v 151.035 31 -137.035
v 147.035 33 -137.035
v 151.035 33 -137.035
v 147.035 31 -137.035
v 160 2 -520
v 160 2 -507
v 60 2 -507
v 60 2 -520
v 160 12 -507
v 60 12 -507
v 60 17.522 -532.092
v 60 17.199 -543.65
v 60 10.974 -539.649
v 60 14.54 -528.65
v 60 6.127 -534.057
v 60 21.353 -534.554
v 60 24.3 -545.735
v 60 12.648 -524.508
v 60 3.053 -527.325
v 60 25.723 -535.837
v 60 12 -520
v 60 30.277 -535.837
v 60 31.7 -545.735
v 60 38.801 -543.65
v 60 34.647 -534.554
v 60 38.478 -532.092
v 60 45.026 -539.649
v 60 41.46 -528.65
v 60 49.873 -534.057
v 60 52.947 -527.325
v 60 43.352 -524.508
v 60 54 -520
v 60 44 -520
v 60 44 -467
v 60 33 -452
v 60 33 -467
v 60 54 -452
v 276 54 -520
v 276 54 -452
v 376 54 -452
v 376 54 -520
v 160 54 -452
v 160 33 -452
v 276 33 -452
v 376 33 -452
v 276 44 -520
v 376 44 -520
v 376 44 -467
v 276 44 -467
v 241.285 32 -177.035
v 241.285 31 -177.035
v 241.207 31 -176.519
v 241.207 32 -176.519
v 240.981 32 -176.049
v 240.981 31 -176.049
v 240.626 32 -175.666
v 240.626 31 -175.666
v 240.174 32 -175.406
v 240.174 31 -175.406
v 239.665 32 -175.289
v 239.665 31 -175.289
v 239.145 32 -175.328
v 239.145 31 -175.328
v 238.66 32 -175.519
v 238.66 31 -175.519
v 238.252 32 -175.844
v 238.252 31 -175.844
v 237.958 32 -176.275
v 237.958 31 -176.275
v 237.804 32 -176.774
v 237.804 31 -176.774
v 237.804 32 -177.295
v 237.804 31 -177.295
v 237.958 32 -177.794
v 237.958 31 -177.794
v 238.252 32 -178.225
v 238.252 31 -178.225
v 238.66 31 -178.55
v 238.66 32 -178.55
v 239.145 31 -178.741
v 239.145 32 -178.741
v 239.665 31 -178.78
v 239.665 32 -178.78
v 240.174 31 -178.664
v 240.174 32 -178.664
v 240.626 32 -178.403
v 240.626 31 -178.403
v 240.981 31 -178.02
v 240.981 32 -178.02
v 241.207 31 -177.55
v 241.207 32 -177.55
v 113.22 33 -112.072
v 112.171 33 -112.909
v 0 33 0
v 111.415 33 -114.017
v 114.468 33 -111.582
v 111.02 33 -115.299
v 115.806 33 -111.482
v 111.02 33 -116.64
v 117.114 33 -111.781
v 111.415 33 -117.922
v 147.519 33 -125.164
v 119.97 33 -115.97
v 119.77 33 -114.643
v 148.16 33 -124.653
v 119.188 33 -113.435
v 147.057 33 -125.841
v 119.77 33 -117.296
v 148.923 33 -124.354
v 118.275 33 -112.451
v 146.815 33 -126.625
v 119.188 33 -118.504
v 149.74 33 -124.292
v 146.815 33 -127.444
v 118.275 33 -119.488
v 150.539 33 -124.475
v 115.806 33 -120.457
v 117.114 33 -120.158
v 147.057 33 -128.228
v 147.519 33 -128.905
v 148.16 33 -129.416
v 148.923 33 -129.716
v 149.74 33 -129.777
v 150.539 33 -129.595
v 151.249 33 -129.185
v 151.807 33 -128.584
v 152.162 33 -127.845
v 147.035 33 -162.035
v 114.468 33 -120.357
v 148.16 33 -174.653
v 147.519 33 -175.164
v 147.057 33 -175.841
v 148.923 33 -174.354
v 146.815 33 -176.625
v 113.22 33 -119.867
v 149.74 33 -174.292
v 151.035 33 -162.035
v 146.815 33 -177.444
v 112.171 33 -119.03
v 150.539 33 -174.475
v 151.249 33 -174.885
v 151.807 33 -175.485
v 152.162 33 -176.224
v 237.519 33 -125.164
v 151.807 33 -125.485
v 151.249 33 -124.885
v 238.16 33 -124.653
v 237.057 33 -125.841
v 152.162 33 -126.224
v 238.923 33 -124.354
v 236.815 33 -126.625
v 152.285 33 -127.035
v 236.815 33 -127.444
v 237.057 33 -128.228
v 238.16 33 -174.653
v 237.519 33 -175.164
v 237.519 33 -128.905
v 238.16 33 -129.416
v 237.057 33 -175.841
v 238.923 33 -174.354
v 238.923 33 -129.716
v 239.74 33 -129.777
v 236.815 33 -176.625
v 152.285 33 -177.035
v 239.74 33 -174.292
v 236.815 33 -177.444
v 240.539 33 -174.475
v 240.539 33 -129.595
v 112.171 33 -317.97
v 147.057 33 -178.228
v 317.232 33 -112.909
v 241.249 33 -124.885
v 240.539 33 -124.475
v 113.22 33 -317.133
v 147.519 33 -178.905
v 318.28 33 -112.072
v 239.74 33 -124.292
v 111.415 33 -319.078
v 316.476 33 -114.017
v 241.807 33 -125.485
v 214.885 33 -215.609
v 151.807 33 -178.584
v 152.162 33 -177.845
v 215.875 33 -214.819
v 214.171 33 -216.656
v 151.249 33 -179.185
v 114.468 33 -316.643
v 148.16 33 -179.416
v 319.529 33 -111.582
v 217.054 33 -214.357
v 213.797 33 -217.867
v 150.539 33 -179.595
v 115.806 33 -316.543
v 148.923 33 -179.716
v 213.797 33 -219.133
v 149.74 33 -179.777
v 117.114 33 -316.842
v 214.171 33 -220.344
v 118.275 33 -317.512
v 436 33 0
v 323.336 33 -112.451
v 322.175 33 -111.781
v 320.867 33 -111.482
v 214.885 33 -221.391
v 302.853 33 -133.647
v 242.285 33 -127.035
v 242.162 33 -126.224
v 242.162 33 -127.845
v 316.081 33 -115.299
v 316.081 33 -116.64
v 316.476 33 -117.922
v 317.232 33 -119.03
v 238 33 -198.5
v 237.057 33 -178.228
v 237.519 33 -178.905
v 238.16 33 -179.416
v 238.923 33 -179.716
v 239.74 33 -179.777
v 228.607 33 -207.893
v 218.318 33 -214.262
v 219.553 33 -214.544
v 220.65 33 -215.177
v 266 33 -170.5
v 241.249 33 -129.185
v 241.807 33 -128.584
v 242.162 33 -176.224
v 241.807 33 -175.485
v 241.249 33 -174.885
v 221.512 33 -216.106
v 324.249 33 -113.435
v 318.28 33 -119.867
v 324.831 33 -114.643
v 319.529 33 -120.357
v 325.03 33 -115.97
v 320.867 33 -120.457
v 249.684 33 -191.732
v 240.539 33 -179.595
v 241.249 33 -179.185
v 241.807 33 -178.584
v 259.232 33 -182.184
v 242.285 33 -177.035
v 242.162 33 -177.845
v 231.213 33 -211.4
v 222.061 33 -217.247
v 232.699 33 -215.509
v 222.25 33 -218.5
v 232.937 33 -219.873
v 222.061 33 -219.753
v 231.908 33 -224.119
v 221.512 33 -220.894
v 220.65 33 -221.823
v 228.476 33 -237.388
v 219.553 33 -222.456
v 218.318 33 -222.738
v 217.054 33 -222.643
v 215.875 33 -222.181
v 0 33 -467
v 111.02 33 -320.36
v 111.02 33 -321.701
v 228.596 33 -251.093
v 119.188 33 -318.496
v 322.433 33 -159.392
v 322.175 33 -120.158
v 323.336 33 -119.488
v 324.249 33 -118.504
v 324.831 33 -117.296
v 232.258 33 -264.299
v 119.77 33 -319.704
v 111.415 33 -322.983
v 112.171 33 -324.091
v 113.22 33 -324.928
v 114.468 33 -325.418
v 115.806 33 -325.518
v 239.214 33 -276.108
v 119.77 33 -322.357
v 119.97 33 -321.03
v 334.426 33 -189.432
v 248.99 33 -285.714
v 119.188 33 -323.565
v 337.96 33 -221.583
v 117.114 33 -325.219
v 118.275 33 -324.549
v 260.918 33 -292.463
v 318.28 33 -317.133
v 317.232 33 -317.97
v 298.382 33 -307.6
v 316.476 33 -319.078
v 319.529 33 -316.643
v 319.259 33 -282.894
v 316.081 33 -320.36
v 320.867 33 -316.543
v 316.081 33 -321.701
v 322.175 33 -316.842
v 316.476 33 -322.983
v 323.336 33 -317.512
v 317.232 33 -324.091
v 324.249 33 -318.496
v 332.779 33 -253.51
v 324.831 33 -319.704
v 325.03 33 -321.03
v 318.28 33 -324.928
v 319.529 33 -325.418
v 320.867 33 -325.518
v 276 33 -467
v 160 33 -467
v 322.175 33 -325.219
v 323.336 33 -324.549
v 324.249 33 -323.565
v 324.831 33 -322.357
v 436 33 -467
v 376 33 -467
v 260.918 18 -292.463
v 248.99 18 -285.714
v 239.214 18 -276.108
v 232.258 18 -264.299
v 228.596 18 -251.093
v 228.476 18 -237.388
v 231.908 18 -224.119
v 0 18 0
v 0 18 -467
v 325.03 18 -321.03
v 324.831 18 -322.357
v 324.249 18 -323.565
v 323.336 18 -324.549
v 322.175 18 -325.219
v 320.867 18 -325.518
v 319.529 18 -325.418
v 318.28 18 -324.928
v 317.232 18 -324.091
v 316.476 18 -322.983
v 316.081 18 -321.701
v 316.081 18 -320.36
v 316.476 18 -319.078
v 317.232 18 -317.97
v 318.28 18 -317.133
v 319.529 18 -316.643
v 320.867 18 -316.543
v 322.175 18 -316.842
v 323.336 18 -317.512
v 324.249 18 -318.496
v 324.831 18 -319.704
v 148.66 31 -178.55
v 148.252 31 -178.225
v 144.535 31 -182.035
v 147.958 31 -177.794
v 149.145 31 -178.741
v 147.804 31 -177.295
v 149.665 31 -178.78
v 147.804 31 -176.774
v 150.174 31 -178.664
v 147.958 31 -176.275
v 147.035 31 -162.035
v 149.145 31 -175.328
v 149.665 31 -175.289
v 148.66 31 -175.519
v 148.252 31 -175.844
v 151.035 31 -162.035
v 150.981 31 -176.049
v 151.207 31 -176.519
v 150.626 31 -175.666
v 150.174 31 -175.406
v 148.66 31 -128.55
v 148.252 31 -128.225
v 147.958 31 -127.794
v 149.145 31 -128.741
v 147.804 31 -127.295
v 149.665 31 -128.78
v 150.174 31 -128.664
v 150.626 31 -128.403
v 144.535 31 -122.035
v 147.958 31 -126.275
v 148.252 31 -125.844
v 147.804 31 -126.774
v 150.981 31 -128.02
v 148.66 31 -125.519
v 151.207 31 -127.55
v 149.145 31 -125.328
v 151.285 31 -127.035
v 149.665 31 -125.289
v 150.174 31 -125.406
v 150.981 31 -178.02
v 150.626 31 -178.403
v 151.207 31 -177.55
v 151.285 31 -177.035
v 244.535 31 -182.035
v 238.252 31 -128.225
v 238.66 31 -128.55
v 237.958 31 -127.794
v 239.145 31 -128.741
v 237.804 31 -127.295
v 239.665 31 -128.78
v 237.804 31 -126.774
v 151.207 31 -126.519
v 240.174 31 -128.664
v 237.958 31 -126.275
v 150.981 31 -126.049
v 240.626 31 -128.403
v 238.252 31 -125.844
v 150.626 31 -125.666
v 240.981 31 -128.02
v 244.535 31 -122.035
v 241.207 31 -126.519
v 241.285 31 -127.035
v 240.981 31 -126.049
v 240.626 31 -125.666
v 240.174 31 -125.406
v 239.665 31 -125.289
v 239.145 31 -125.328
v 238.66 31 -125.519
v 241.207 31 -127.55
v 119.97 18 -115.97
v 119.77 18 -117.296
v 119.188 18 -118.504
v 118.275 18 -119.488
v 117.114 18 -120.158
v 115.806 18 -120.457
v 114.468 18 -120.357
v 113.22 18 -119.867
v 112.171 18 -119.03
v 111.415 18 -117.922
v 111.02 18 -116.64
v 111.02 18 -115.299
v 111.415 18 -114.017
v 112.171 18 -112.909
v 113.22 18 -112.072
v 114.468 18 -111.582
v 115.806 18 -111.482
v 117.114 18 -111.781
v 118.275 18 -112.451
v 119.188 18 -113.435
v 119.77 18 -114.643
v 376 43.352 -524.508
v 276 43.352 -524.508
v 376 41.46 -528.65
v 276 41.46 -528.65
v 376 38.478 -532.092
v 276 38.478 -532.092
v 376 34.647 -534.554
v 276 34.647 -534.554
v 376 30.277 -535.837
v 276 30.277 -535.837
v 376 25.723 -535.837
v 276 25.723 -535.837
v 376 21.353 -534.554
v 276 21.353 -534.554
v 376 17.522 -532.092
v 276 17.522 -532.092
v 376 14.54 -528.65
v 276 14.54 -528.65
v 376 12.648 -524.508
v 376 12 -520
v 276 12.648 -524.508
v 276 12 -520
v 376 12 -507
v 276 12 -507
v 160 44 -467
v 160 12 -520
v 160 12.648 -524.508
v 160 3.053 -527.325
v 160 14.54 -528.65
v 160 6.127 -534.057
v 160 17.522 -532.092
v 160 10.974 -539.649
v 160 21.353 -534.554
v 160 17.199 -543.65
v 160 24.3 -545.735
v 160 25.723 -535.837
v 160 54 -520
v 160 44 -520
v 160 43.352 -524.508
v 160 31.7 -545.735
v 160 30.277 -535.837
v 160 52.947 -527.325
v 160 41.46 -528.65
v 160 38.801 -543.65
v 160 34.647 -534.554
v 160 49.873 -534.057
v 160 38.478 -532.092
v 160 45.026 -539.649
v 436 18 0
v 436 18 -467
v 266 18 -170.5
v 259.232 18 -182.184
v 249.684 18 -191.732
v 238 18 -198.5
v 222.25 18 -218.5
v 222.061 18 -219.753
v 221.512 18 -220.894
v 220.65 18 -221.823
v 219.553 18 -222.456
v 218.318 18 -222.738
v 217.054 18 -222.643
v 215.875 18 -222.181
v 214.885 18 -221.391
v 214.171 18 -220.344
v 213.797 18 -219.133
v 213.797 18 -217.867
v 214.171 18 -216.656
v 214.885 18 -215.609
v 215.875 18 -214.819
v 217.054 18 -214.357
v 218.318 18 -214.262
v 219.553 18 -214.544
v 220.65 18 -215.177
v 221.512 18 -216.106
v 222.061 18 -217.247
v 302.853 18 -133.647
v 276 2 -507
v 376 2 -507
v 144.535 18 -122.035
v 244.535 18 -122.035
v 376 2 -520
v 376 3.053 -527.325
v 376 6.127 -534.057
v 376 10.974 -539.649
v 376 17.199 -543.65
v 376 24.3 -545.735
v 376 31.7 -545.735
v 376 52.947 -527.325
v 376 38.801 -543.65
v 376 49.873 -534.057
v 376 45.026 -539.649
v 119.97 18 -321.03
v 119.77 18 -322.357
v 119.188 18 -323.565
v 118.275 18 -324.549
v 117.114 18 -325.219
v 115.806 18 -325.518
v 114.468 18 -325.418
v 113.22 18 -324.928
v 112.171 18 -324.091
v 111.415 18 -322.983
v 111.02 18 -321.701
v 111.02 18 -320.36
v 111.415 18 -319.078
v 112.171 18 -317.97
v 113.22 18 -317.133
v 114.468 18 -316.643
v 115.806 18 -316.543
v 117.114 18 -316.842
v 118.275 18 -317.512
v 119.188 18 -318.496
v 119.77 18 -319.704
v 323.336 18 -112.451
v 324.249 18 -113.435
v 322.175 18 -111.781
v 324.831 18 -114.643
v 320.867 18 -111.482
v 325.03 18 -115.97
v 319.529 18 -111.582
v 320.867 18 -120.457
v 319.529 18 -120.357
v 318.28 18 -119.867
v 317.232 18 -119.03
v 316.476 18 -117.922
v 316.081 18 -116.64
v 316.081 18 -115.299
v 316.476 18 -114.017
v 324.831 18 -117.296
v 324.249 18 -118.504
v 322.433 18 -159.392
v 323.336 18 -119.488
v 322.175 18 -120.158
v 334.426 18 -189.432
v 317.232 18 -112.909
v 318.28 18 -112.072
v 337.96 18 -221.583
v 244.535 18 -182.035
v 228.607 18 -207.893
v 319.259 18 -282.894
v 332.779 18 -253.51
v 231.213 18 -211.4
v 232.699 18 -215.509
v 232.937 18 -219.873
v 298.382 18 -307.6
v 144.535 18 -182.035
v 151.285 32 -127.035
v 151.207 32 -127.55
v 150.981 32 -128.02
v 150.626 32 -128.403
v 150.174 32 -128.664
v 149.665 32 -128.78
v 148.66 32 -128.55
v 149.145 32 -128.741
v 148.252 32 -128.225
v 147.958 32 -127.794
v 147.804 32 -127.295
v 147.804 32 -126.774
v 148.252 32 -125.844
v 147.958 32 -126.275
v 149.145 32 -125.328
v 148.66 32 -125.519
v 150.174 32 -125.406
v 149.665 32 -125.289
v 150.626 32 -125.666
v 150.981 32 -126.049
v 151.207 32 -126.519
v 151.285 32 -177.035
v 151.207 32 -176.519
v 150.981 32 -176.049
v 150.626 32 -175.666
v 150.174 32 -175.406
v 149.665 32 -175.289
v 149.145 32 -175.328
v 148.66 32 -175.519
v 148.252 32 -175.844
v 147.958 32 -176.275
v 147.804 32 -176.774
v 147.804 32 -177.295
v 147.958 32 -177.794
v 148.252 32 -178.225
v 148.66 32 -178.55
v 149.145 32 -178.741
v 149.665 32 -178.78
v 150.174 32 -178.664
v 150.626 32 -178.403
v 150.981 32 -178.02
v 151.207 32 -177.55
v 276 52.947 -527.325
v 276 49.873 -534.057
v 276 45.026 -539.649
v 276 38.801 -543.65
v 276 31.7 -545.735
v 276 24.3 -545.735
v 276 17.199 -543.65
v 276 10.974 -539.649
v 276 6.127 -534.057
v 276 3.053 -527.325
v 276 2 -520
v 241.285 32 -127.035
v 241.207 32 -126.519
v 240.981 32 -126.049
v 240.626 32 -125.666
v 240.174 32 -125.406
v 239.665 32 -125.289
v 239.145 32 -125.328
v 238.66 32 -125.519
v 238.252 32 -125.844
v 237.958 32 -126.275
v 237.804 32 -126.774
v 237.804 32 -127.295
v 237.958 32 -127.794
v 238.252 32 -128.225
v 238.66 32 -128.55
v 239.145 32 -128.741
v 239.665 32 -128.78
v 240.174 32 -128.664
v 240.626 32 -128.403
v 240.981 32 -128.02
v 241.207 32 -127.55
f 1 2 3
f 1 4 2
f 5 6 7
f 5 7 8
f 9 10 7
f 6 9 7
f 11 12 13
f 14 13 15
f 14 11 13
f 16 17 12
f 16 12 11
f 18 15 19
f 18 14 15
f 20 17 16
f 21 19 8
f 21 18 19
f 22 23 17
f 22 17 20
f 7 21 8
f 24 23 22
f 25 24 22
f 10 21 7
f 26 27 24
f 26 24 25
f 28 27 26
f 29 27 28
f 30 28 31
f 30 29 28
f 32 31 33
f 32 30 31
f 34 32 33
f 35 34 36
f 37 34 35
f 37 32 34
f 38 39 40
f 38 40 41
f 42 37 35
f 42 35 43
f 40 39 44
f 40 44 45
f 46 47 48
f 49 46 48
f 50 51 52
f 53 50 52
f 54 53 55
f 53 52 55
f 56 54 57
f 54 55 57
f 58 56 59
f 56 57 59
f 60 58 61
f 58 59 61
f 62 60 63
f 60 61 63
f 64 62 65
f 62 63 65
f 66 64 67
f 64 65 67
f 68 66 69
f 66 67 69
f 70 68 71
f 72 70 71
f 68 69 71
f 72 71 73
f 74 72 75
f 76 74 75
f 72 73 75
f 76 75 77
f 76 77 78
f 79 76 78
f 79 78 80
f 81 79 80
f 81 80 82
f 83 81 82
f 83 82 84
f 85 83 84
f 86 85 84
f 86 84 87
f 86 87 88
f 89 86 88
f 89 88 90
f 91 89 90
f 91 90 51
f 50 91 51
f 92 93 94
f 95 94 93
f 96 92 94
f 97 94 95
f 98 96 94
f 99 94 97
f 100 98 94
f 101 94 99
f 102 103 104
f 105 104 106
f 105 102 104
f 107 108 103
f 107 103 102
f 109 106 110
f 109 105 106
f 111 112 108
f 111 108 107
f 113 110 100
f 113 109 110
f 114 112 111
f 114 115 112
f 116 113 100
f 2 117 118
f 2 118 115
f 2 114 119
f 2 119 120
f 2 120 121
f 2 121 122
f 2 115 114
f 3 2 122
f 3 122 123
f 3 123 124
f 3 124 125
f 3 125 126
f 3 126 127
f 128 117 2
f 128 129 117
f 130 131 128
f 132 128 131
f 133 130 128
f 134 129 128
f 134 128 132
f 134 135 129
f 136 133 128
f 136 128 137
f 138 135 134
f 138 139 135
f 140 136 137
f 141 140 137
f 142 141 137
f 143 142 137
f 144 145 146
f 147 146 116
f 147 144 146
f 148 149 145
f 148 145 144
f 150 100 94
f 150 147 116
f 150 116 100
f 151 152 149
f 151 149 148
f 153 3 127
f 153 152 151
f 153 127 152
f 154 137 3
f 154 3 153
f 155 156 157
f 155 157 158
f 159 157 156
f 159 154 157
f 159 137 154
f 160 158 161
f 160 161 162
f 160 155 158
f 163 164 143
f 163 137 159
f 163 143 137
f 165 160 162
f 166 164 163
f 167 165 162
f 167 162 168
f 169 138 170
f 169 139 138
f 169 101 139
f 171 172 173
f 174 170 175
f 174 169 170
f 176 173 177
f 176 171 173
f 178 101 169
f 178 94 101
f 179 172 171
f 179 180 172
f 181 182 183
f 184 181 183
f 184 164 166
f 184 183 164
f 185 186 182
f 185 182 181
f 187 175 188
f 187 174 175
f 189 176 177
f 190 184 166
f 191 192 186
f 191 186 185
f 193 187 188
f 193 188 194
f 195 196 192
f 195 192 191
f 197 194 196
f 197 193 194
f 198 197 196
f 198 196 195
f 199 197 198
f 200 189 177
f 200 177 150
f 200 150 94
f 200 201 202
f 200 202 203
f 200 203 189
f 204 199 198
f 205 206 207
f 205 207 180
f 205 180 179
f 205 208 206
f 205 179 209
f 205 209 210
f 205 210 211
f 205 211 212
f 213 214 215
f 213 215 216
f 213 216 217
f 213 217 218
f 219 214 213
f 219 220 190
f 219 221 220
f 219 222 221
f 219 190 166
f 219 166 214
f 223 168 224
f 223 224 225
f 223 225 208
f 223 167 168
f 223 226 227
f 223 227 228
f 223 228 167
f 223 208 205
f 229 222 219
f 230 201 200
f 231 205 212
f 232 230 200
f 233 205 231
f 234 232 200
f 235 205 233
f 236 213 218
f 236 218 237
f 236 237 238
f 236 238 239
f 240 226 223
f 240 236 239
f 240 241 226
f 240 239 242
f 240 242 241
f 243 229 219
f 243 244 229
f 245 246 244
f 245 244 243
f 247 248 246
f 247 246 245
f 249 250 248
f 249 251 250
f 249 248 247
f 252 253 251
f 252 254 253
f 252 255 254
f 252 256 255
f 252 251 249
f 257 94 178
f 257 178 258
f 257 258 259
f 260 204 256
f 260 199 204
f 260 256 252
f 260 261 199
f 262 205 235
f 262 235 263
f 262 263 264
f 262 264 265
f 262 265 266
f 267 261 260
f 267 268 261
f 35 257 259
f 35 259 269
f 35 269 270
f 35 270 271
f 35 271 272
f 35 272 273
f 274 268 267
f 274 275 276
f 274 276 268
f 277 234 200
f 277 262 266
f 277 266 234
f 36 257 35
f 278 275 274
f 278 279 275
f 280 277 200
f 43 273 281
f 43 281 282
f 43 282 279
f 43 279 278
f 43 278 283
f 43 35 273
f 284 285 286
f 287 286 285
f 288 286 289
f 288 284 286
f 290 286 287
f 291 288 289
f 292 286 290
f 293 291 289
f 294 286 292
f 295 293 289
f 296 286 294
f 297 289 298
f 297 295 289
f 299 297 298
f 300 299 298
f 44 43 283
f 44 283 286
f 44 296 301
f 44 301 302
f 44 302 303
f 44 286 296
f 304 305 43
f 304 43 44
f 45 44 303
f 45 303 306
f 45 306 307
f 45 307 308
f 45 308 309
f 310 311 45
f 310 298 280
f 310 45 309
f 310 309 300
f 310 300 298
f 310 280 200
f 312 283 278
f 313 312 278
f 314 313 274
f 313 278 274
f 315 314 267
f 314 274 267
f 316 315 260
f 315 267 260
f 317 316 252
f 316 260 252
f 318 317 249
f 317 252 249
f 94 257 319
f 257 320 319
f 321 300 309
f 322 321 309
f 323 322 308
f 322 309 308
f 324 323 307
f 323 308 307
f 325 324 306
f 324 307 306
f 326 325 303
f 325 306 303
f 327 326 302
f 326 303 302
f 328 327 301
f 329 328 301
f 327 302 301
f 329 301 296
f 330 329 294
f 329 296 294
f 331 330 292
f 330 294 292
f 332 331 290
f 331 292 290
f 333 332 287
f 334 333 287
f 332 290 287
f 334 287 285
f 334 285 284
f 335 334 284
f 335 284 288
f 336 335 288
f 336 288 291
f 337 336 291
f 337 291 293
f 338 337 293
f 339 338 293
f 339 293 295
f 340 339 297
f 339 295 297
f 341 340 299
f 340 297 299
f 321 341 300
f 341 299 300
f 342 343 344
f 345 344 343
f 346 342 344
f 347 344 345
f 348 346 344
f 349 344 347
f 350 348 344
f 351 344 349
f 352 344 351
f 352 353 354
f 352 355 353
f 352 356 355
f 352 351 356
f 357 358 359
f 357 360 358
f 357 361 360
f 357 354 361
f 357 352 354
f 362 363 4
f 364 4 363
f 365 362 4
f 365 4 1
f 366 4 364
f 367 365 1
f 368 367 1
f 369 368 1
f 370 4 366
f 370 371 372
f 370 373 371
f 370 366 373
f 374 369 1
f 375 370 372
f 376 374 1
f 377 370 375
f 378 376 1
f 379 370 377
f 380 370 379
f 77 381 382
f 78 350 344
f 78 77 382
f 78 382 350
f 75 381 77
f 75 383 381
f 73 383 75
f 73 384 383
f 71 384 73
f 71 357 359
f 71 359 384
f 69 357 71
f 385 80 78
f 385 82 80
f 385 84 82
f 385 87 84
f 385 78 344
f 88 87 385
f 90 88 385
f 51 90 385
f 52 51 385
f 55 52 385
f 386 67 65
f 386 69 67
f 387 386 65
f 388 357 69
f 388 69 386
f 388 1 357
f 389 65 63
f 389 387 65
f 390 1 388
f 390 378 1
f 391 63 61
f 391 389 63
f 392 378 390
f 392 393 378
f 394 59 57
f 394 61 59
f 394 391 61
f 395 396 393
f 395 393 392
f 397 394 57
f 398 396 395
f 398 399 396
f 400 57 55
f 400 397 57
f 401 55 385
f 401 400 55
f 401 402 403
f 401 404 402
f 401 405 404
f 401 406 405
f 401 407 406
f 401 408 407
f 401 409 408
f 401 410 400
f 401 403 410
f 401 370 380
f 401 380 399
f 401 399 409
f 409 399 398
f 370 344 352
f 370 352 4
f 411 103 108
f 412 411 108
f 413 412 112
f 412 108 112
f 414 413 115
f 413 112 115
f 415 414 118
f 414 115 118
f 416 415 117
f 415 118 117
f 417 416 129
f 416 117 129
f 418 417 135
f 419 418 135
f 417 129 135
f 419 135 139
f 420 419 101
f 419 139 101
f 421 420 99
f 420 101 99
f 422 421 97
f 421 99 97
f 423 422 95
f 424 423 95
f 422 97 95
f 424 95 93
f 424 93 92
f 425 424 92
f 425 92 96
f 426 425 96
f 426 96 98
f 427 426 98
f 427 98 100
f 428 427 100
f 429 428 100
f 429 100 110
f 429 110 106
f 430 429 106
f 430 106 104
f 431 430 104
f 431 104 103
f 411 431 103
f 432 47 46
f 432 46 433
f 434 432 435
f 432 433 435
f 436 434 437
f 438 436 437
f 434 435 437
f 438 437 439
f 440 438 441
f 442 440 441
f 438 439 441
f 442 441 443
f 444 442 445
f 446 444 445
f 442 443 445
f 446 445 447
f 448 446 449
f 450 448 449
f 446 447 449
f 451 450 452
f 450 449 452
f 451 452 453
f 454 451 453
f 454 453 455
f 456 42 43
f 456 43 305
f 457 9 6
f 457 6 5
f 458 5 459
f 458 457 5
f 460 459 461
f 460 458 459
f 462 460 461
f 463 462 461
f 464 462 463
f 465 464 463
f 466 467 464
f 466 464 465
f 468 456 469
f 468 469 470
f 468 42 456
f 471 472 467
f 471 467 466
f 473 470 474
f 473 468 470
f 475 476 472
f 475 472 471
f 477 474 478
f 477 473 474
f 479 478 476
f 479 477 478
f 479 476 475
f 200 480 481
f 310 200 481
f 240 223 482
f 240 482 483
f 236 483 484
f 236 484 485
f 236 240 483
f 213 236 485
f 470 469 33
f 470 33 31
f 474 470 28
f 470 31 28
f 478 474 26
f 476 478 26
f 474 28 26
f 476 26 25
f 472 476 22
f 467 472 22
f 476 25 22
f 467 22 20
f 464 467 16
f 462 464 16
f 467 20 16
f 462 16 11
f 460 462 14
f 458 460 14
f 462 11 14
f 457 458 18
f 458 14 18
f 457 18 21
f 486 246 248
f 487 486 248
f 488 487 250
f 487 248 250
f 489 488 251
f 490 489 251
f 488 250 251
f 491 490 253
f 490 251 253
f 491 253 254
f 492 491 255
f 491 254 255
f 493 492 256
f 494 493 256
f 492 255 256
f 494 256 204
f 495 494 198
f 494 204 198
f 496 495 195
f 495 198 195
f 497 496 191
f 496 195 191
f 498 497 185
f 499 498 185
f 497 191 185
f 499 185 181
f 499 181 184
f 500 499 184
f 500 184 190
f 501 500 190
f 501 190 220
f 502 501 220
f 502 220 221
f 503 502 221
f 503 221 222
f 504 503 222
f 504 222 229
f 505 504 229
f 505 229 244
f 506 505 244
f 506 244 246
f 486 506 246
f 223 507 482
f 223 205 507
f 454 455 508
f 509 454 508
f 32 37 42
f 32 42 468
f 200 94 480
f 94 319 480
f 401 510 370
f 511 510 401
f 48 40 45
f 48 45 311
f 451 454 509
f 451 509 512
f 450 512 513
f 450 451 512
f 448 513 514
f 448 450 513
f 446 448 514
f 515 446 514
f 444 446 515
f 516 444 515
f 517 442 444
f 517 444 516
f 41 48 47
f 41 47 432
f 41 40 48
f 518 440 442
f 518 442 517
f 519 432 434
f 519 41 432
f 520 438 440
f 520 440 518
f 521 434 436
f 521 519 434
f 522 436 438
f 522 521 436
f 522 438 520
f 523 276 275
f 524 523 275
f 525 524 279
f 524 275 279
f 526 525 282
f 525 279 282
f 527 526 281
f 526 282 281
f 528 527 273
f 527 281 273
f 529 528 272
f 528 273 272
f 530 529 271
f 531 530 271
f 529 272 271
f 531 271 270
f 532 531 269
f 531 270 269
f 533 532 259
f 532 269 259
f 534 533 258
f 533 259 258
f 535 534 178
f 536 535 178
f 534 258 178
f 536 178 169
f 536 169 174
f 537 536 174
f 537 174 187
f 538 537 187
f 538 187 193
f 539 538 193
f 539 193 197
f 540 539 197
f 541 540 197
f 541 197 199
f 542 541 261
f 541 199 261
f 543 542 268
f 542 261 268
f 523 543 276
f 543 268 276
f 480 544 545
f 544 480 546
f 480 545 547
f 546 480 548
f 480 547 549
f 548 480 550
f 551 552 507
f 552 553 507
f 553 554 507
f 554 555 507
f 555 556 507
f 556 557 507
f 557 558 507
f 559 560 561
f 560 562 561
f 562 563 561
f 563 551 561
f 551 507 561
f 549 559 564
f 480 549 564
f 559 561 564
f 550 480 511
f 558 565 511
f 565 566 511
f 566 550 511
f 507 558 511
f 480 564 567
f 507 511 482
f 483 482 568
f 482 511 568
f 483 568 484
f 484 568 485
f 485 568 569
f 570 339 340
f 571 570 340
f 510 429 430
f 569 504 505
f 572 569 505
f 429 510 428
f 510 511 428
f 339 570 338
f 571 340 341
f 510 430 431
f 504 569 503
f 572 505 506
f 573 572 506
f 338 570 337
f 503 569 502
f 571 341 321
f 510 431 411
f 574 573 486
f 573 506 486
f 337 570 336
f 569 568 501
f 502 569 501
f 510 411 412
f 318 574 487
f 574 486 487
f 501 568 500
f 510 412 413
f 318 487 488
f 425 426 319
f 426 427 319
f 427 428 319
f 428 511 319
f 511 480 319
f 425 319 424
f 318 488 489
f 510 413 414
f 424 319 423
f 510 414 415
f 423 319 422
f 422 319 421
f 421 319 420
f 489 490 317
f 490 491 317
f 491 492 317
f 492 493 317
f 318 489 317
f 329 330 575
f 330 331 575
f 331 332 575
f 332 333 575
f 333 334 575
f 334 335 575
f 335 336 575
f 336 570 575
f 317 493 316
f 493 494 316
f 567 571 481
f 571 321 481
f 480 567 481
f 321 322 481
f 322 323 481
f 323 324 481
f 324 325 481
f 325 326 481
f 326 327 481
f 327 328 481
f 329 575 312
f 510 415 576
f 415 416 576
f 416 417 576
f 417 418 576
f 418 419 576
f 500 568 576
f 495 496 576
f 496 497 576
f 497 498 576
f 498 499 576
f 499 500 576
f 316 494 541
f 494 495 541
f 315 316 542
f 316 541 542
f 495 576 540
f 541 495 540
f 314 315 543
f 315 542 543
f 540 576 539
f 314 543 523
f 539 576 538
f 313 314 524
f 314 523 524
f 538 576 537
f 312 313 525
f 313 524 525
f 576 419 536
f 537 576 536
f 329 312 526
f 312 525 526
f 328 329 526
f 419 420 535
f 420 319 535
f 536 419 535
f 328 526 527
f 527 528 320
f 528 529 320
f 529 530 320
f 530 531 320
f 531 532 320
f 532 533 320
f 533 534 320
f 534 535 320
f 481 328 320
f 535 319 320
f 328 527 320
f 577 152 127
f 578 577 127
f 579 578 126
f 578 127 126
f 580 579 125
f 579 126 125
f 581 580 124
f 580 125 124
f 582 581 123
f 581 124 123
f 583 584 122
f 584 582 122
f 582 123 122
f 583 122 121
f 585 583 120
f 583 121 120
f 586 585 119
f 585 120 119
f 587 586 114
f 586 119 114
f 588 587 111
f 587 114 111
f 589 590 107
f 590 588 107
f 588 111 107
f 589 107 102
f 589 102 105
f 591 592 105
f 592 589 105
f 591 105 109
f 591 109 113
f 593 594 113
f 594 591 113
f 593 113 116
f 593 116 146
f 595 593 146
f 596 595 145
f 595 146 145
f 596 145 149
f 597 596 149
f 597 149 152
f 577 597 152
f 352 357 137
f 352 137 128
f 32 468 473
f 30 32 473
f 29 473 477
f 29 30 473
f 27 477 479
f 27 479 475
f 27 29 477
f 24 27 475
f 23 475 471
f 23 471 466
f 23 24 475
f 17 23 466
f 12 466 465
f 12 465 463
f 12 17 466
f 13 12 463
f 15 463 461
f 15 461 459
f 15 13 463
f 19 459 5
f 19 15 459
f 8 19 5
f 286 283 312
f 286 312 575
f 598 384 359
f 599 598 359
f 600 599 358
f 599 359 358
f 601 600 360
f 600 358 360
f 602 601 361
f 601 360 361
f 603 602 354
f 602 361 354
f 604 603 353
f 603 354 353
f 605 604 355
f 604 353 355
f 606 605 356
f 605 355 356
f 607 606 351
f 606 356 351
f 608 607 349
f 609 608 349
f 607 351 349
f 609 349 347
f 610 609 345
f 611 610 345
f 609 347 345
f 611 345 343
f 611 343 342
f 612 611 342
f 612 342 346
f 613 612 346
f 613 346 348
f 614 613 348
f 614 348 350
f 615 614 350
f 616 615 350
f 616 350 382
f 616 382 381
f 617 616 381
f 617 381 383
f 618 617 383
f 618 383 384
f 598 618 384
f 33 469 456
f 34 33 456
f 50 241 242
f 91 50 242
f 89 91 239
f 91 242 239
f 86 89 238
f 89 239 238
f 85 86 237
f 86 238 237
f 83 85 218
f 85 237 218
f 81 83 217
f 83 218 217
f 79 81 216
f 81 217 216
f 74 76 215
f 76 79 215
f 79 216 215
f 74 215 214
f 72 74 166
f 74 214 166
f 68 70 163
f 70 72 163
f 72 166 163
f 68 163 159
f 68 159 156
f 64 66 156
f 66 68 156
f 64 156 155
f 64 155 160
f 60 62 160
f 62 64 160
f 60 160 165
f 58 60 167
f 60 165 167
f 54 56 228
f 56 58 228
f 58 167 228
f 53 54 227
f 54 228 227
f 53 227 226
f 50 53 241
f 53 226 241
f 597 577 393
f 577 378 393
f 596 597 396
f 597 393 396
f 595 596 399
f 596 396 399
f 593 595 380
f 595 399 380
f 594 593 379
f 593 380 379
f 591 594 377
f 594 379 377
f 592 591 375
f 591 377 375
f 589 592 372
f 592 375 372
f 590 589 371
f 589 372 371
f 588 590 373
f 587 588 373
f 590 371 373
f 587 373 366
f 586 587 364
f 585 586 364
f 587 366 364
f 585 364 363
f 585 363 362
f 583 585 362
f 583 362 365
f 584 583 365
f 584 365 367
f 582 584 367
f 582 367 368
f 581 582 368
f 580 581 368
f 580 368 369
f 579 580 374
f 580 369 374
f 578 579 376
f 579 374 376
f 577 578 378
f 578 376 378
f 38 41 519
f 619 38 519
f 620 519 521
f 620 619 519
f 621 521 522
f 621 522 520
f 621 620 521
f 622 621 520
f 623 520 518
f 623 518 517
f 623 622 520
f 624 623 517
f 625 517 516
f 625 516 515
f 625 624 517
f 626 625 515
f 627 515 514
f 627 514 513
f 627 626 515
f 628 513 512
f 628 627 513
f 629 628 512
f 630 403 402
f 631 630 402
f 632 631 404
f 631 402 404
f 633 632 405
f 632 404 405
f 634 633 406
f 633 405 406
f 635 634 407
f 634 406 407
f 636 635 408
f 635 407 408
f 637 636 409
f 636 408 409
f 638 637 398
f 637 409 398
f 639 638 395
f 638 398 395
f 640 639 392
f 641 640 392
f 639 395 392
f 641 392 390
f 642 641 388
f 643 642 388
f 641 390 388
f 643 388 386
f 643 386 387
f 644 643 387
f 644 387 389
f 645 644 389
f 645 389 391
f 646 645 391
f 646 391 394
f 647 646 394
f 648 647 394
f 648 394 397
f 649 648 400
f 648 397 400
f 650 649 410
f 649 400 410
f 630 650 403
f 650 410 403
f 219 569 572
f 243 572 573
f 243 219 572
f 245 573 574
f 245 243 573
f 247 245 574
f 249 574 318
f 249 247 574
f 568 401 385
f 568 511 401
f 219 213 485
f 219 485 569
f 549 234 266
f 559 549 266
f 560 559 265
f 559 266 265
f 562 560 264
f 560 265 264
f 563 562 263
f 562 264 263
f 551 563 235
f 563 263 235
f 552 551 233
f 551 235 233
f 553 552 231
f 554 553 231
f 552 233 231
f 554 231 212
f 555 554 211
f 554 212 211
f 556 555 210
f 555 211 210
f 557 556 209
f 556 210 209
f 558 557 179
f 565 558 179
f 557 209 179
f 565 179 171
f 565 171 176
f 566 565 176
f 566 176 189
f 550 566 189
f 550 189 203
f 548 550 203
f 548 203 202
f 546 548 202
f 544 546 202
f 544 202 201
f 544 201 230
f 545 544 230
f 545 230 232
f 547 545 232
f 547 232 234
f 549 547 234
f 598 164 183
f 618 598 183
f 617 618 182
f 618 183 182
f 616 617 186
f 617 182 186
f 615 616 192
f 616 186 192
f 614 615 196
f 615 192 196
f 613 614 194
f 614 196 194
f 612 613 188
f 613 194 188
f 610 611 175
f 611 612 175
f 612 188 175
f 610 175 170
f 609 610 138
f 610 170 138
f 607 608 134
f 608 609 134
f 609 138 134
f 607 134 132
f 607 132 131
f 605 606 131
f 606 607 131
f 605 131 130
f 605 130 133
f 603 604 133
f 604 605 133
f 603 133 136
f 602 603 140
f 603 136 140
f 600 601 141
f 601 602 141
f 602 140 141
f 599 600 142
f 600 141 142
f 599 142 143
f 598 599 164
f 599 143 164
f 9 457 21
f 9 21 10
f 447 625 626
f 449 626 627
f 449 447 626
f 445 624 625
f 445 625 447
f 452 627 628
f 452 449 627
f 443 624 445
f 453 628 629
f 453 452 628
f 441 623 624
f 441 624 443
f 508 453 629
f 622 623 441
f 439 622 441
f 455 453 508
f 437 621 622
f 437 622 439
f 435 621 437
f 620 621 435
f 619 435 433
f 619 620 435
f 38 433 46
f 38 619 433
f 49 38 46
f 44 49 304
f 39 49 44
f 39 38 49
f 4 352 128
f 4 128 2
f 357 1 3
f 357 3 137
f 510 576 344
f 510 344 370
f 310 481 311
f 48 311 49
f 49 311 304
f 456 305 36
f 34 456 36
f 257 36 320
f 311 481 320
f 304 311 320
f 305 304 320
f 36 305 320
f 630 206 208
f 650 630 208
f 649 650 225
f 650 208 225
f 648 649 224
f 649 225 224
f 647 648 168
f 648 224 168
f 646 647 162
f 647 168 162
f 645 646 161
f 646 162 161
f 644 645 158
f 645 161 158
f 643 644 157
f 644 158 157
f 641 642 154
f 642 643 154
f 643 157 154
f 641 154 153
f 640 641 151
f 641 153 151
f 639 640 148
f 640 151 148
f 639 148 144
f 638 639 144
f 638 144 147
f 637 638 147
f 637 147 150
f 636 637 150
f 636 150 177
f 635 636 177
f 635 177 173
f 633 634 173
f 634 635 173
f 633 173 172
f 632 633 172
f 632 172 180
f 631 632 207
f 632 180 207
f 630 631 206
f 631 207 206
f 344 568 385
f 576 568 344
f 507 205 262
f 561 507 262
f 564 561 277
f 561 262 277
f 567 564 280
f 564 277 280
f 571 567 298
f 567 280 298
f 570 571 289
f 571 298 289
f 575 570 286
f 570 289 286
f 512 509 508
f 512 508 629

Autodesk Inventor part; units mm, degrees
ref_plane "YZ Plane" through (0, 0, 0) normal (1, 0, 0) x (0, 1, 0)
ref_plane "XZ Plane" through (0, 0, 0) normal (0, 1, 0) x (-1, 0, 0)
ref_plane "XY Plane" through (0, 0, 0) normal (0, 0, 1) x (1, 0, 0)
sketch "Sketch6" plane through (0, 0, 0) normal (0, 1, 0) x (-1, 0, 0)
  line L0 (0, 0) -> (-436, 0)
  line L1 (-436, 0) -> (-436, -467)
  line L2 (-436, -467) -> (0, -467)
  line L3 (0, -467) -> (0, 0)
  dimension "d25" = 436
  dimension "d26" = 467
extrude "Extrusion5" add sketch "Sketch6" along normal blind 56
sketch "Sketch7" plane through (436, 0, -467) normal (0, 0, -1) x (-1, 0, 0)
  line L0 (436, 0) -> (0, 0) projected
  line L1 (218, 0) -> (376, 0)
  line L2 (218, 0) -> (376, 0) construction
  line L3 (376, 0) -> (376, 56)
  line L4 (436, 56) -> (0, 56) projected
  line L5 (376, 56) -> (60, 56)
  line L6 (376, 56) -> (692, 56) construction
  line L7 (60, 56) -> (60, 0)
  line L8 (60, 0) -> (218, 0)
  line L9 (60, 0) -> (160, 0)
  line L10 (160, 0) -> (160, 56)
  line L11 (376, 0) -> (276, 0)
  line L12 (376, 0) -> (476, 0) construction
  line L13 (276, 0) -> (276, 56)
  dimension "d29" = 158
  dimension "d30" = 0
  dimension "d31" = 316
  dimension "d32" = 180
  dimension "d33" = 100
  dimension "d34" = 100
  dimension "d35" = 180
extrude "Extrusion6" add sketch "Sketch7" along normal blind 100 contours L0 L13 L4 L3 | L0 L7 L4 L10
sketch "Sketch8" plane through (0, 0, -467) normal (-1, 0, 0) x (0, 0, 1)
  arc A0 (-53, 44) -> (-53, 12) centre (-53, 28) ccw
  line L0 (0, 0) -> (-100, 0) projected
  line L1 (-100, 0) -> (-100, 56) projected
  arc A1 (-53, 54) -> (-53, 2) centre (-53, 28) ccw
  line L2 (0, 0) -> (-100, 0)
  line L3 (-100, 56) -> (-100, 0) projected
  line L4 (-100, 0) -> (-100, 56)
  line L5 (0, 56) -> (-100, 56) projected
  line L6 (-100, 56) -> (0, 56)
  line L7 (-53, 54) -> (0, 54)
  line L8 (-53, 12) -> (-40, 12)
  line L9 (-40, 12) -> (-40, 2)
  line L10 (-40, 2) -> (-53, 2)
  line L11 (-53, 44) -> (0, 44)
  line L12 (467, 0) -> (0, 0) projected
  line L13 (0, 56) -> (0, 0)
  line L14 (0, 44) -> (0, 54)
  point P0 (467, 56)
  dimension "d30" = 0
  dimension "d32" = 180
  dimension "d35" = 180
  dimension "d38" = 28
  dimension "d39" = 32
  dimension "d40" = 47
  dimension "d45" = 52
  dimension "d50" = 13
extrude "Extrusion8" cut sketch "Sketch8" against normal through all contours L11 L13 L0 L1 L5 L7 A1 L10 L9 L8 A0
sketch "Sketch9" plane through (0, 0, -467) normal (-1, 0, 0) x (0, 0, 1)
  line L0 (467, 0) -> (0, 0) projected
  line L1 (0, 0) -> (467, 0)
  line L2 (467, 0) -> (467, 18)
  line L3 (467, 18) -> (0, 18)
  line L4 (0, 18) -> (0, 0)
  line L5 (0, 0) -> (0, 56) projected
  line L6 (467, 0) -> (467, 56) projected
  line L7 (0, 56) -> (467, 56)
  line L8 (467, 56) -> (467, 54)
  line L9 (467, 54) -> (0, 54)
  line L10 (0, 54) -> (0, 56)
  dimension "d59" = 467
  dimension "d60" = 18
  dimension "d61" = 2
extrude "Extrusion9" cut sketch "Sketch9" against normal through all contours L0 L4 L3 L2 | L9 L5 L7 L6
sketch "Sketch10" plane through (0, 54, 0) normal (0, 1, 0) x (1, 0, 0)
  line L0 (376, 520) -> (376, 467) projected
  line L1 (436, 467) -> (436, 0) projected
  line L2 (376, 467) -> (436, 467)
  line L3 (436, 467) -> (436, 0)
  line L4 (436, 0) -> (0, 0) projected
  line L5 (436, 0) -> (0, 0)
  line L6 (0, 467) -> (60, 467) projected
  line L7 (0, 0) -> (0, 467)
  line L8 (0, 467) -> (60, 467)
  line L9 (60, 467) -> (60, 452)
  line L10 (60, 452) -> (160, 452)
  line L11 (160, 520) -> (160, 467) projected
  line L12 (160, 452) -> (160, 467)
  line L13 (276, 467) -> (276, 520) projected
  line L14 (160, 467) -> (276, 467)
  line L15 (276, 467) -> (276, 452)
  line L16 (276, 452) -> (376, 452)
  line L17 (376, 452) -> (376, 467)
  dimension "d64" = 15
  dimension "d65" = 90
extrude "Extrusion10" cut sketch "Sketch10" against normal blind 21
sketch "Sketch11" plane through (0, 33, 0) normal (0, 1, 0) x (1, 0, 0)
  circle A0 centre (218, 218.5) radius 4.25
  line L0 (0, 0) -> (0, 467) projected
  line L1 (436, 0) -> (0, 0) projected
  dimension "d70" = 8.5
  dimension "d71" = 218
  dimension "d72" = 218.5
extrude "Extrusion11" cut sketch "Sketch11" against normal through all
sketch "Sketch12" plane through (0, 33, 0) normal (0, 1, 0) x (1, 0, 0)
  circle A0 centre (218, 218.5) radius 4.25 projected
  circle A1 centre (218, 218.5) radius 120
  circle A2 centre (218, 218.5) radius 15
  line L0 (231.9078, 224.1191) -> (329.2621, 263.4528)
  line L1 (233, 218.5) -> (338, 218.5)
  arc A3 (329.2621, 263.4528) -> (231.9078, 224.1191) centre (280.5849, 243.7859) ccw
  circle A4 centre (218, 218.5) radius 145
  circle A5 centre (320.5305, 115.9695) radius 4.5
  circle A6 centre (320.5305, 321.0305) radius 4.5
  circle A7 centre (115.4695, 321.0305) radius 4.5
  circle A8 centre (115.4695, 115.9695) radius 4.5
  line L2 (320.5305, 115.9695) -> (302.8528, 133.6472)
  line L3 (320.5305, 115.9695) -> (345.5305, 115.9695) construction
  line L4 (222.25, 218.5) -> (233, 218.5)
  line L5 (218, 203.5) -> (218, 150.5)
  line L6 (218, 218.5) -> (281, 218.5) construction
  arc A9 (266, 170.5) -> (238, 198.5) centre (218, 150.5) ccw
  line L7 (302.8528, 133.6472) -> (266, 170.5)
  line L8 (238, 198.5) -> (228.6066, 207.8934)
  line L9 (218, 203.5) -> (218, 214.25)
  line L10 (260.9181, 292.4631) -> (298.382, 307.5995)
  point P0 (0, 0)
  dimension "d81" = 290
  dimension "d76" = 30
  dimension "d77" = 240
  dimension "d82" = 9
  dimension "d87" = 360
  dimension "d90" = 135
  dimension "d91" = 22
  dimension "d92" = 68
  dimension "d95" = 52
extrude "Extrusion12" cut sketch "Sketch12" against normal through all contours L1 A1 L7 A9 L8 A2 | A2 L0 A1 L1 | A3 L0 | A5 A4 L2 | L2 A4 A5 | A3 L10 A1 | A5 A4 | A8 A4 | A4 A8 | A6 A4 | A4 A6 | A7 A4 | A4 A7
sketch "Sketch13" plane through (0, 18, -467) normal (0, -1, 0) x (1, 0, 0)
  arc A0 (179.5346, 284.9654) -> (179.5346, 344.9654) centre (219.5346, 314.9654) ccw
  line L0 (144.5346, 344.9654) -> (244.5346, 344.9654)
  line L1 (244.5346, 344.9654) -> (244.5346, 284.9654)
  line L2 (244.5346, 284.9654) -> (144.5346, 284.9654)
  line L3 (144.5346, 284.9654) -> (144.5346, 344.9654)
  point P0 (0, 467)
  point P1 (266, 296.5)
  point P2 (238, 268.5)
  dimension "d96" = 100
  dimension "d97" = 100
  dimension "d98" = 60
  dimension "d99" = 25
  dimension "d100" = 30
extrude "Extrusion13" cut sketch "Sketch13" against normal blind 13 contours L2 L3 L0 L1
sketch "Sketch14" plane through (0, 31, -467) normal (0, -1, 0) x (1, 0, 0)
  line L0 (144.5346, 284.9654) -> (144.5346, 344.9654) projected
  line L1 (244.5346, 284.9654) -> (144.5346, 284.9654) projected
  line L2 (244.5346, 344.9654) -> (244.5346, 284.9654) projected
  line L3 (144.5346, 344.9654) -> (244.5346, 344.9654) projected
  circle A0 centre (239.5346, 289.9654) radius 1.75
  circle A1 centre (149.5346, 289.9654) radius 1.75
  circle A2 centre (239.5346, 339.9654) radius 1.75
  circle A3 centre (149.5346, 339.9654) radius 1.75
  line L4 (147.0346, 329.9654) -> (151.0346, 329.9654)
  line L5 (151.0346, 329.9654) -> (151.0346, 304.9654)
  line L6 (151.0346, 304.9654) -> (147.0346, 304.9654)
  line L7 (147.0346, 304.9654) -> (147.0346, 329.9654)
  point P0 (0, 467)
  dimension "d103" = 3.5
  dimension "d104" = 5
  dimension "d105" = 5
  dimension "d108" = 90
  dimension "d111" = 50
  dimension "d117" = 4
  dimension "d118" = 25
  dimension "d119" = 15
  dimension "d120" = 2.5
extrude "Extrusion14" cut sketch "Sketch14" against normal through all contours A0 | A1 | A2 | A3 | L4 L5 L6 L7
chamfer "Chamfer1" distance 1 angle 45 4 edges at (147.7846, 33, -177.0346) (147.7846, 33, -127.0346) (237.7846, 33, -127.0346) (237.7846, 33, -177.0346)
properties part number "bin_lid"
